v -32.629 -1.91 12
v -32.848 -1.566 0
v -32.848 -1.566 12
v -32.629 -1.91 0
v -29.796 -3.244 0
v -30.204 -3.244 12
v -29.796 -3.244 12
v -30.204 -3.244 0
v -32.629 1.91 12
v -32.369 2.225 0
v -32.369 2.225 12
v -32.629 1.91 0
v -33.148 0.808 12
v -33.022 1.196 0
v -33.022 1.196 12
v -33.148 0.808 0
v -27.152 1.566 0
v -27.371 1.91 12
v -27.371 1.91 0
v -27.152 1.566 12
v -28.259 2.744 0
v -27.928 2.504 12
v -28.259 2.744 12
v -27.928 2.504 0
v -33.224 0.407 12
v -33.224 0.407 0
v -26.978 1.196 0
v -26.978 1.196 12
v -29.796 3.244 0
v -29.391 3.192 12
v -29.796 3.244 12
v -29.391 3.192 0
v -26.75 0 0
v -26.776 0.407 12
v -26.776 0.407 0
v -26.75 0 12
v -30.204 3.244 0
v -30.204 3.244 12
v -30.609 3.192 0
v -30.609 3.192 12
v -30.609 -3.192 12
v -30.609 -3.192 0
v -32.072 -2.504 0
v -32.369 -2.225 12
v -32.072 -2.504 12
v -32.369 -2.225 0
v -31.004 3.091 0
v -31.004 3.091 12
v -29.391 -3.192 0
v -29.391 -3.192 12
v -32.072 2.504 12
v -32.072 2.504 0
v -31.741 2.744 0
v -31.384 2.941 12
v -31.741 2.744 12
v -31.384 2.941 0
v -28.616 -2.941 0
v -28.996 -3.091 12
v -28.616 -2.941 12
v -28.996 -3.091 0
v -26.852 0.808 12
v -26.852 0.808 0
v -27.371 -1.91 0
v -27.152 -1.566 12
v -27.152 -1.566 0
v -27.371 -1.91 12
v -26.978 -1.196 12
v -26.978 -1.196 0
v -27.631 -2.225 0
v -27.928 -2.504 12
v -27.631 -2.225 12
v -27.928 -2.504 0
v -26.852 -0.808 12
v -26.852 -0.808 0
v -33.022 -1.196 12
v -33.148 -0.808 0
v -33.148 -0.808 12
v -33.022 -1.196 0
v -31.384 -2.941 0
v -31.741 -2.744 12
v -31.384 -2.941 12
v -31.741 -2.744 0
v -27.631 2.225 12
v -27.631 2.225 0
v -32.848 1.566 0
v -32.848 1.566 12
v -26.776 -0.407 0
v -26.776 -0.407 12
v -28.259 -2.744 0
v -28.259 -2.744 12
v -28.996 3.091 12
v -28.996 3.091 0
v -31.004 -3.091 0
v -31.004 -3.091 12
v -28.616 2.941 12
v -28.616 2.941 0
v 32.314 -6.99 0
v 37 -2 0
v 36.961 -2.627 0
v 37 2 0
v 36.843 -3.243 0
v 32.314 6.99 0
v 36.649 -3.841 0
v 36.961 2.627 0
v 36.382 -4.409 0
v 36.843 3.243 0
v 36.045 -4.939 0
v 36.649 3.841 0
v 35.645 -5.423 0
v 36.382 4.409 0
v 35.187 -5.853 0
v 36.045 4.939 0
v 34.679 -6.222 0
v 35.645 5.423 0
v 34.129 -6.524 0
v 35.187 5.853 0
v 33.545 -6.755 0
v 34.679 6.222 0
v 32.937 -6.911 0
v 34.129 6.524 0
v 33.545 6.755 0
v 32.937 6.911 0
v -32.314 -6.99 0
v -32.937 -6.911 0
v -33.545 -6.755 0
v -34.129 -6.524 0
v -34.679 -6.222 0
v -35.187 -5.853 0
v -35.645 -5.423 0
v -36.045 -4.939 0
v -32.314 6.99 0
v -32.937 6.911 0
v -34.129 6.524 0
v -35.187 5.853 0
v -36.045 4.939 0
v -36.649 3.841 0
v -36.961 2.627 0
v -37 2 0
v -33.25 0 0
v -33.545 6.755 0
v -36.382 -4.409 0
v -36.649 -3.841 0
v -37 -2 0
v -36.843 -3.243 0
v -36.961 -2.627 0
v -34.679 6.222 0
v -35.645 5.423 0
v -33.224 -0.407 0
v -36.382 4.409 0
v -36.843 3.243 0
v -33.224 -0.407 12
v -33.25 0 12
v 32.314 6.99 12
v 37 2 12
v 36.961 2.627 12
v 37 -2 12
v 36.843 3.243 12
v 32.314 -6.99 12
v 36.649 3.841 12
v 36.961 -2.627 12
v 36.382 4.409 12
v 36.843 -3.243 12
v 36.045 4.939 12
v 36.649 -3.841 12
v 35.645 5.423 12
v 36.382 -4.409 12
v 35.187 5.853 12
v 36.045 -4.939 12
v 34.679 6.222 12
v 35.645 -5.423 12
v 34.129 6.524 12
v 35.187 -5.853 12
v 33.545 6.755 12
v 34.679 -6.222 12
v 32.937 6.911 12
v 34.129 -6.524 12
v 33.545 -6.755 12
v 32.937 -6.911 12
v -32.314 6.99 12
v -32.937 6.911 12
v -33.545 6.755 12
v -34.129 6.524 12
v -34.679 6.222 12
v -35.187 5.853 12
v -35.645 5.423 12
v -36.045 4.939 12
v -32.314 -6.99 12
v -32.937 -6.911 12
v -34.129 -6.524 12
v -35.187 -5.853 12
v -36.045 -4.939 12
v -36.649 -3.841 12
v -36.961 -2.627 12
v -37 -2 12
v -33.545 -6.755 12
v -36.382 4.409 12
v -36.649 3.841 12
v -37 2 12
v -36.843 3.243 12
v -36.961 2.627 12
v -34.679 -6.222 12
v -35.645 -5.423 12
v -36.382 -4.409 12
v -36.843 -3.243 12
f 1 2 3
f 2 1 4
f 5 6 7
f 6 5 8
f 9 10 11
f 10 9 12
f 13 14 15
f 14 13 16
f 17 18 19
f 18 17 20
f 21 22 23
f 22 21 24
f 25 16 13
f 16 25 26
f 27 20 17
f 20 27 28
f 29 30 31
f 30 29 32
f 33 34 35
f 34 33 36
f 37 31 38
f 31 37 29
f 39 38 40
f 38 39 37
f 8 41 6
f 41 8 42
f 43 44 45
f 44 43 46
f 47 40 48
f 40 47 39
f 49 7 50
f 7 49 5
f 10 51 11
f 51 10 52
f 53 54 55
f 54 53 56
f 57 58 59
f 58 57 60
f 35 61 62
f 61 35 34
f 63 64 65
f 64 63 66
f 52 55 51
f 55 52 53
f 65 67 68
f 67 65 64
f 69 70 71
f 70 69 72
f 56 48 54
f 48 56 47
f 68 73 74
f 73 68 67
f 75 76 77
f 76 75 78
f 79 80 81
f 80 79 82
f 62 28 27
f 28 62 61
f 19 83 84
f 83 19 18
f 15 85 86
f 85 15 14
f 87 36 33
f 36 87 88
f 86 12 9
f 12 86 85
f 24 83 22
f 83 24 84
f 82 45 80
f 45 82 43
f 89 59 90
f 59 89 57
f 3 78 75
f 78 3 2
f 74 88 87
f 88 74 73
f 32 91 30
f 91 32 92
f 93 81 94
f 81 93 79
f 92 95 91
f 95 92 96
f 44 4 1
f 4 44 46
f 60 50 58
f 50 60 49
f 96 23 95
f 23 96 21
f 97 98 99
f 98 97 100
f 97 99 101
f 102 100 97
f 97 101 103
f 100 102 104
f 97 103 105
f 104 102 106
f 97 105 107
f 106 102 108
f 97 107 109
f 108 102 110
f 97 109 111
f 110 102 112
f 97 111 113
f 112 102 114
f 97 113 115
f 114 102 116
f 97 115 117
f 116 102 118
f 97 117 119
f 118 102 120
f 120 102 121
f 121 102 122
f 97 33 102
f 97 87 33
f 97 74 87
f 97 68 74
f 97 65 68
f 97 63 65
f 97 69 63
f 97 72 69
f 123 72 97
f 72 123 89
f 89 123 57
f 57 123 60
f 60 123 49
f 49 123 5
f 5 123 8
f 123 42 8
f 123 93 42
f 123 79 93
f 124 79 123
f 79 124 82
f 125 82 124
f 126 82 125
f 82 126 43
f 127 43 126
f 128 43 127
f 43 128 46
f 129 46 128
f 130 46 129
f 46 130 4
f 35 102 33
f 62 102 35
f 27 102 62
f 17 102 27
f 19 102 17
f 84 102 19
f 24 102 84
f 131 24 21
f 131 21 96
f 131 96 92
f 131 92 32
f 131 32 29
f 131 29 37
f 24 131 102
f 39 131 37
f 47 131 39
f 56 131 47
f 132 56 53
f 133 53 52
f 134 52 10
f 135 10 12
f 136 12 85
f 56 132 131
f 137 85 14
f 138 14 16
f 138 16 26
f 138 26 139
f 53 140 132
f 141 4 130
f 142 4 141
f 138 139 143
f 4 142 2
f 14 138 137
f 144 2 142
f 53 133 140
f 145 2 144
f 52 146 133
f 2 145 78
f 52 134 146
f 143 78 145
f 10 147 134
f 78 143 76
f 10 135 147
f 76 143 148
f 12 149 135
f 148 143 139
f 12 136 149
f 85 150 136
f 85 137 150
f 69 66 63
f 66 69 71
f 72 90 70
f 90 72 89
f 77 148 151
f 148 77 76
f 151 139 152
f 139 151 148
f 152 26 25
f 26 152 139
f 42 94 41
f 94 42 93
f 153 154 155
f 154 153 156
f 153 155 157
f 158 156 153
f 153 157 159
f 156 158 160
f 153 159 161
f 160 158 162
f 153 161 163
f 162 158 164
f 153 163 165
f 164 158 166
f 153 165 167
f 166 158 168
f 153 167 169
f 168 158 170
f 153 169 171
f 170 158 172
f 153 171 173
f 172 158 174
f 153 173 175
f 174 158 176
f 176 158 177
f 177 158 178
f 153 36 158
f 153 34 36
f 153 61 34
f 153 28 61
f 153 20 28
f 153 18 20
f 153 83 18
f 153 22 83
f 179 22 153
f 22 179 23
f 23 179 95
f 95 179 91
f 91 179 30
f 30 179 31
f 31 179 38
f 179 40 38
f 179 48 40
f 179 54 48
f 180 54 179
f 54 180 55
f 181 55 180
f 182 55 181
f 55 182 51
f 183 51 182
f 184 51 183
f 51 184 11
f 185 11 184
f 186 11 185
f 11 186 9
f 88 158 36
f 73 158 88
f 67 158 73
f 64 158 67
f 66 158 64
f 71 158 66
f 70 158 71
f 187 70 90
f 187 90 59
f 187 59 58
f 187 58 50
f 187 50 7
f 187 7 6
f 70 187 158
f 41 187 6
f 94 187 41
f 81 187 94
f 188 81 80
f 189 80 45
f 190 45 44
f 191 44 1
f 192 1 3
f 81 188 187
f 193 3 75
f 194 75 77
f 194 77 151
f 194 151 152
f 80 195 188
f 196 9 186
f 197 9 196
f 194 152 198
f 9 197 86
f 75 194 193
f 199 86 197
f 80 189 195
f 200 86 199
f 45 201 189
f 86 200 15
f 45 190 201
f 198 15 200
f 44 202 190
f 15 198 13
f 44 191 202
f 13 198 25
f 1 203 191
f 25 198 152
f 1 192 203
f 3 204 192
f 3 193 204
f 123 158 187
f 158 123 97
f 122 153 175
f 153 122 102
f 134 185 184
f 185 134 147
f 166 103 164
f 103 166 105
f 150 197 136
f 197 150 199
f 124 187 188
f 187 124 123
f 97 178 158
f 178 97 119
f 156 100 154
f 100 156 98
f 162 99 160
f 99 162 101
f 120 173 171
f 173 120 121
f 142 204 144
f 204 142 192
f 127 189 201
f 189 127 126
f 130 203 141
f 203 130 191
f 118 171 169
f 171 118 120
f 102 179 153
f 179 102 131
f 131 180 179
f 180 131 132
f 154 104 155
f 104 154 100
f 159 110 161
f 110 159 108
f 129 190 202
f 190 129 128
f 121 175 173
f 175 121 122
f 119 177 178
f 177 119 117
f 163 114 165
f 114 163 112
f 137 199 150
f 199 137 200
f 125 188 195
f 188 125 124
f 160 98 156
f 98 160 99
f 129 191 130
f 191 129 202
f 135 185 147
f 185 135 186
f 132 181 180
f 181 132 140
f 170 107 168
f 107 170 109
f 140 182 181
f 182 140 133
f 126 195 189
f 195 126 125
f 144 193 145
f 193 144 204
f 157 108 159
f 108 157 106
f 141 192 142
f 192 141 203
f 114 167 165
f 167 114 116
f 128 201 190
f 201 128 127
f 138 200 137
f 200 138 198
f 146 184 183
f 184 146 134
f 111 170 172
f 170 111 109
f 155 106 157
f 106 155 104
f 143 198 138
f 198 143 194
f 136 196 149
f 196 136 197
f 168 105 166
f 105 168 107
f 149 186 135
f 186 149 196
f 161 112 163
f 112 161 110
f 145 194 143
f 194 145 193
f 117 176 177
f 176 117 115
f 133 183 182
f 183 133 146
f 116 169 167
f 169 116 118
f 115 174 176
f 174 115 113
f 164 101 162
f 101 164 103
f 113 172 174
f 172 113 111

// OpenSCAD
$fn = 50;


difference() {
	union() {
		hull() {
			translate(v = [-32.0000000000, 2.0000000000, 0]) {
				cylinder(h = 12, r = 5);
			}
			translate(v = [32.0000000000, 2.0000000000, 0]) {
				cylinder(h = 12, r = 5);
			}
			translate(v = [-32.0000000000, -2.0000000000, 0]) {
				cylinder(h = 12, r = 5);
			}
			translate(v = [32.0000000000, -2.0000000000, 0]) {
				cylinder(h = 12, r = 5);
			}
		}
	}
	union() {
		translate(v = [-30.0000000000, 0.0000000000, 0]) {
			cylinder(h = 12, r = 3.2500000000);
		}
		translate(v = [-30.0000000000, 0.0000000000, 0]) {
			cylinder(h = 12, r = 1.8000000000);
		}
		translate(v = [-30.0000000000, 0.0000000000, 0]) {
			cylinder(h = 12, r = 1.8000000000);
		}
		translate(v = [-30.0000000000, 0.0000000000, 0]) {
			cylinder(h = 12, r = 1.8000000000);
		}
	}
}
